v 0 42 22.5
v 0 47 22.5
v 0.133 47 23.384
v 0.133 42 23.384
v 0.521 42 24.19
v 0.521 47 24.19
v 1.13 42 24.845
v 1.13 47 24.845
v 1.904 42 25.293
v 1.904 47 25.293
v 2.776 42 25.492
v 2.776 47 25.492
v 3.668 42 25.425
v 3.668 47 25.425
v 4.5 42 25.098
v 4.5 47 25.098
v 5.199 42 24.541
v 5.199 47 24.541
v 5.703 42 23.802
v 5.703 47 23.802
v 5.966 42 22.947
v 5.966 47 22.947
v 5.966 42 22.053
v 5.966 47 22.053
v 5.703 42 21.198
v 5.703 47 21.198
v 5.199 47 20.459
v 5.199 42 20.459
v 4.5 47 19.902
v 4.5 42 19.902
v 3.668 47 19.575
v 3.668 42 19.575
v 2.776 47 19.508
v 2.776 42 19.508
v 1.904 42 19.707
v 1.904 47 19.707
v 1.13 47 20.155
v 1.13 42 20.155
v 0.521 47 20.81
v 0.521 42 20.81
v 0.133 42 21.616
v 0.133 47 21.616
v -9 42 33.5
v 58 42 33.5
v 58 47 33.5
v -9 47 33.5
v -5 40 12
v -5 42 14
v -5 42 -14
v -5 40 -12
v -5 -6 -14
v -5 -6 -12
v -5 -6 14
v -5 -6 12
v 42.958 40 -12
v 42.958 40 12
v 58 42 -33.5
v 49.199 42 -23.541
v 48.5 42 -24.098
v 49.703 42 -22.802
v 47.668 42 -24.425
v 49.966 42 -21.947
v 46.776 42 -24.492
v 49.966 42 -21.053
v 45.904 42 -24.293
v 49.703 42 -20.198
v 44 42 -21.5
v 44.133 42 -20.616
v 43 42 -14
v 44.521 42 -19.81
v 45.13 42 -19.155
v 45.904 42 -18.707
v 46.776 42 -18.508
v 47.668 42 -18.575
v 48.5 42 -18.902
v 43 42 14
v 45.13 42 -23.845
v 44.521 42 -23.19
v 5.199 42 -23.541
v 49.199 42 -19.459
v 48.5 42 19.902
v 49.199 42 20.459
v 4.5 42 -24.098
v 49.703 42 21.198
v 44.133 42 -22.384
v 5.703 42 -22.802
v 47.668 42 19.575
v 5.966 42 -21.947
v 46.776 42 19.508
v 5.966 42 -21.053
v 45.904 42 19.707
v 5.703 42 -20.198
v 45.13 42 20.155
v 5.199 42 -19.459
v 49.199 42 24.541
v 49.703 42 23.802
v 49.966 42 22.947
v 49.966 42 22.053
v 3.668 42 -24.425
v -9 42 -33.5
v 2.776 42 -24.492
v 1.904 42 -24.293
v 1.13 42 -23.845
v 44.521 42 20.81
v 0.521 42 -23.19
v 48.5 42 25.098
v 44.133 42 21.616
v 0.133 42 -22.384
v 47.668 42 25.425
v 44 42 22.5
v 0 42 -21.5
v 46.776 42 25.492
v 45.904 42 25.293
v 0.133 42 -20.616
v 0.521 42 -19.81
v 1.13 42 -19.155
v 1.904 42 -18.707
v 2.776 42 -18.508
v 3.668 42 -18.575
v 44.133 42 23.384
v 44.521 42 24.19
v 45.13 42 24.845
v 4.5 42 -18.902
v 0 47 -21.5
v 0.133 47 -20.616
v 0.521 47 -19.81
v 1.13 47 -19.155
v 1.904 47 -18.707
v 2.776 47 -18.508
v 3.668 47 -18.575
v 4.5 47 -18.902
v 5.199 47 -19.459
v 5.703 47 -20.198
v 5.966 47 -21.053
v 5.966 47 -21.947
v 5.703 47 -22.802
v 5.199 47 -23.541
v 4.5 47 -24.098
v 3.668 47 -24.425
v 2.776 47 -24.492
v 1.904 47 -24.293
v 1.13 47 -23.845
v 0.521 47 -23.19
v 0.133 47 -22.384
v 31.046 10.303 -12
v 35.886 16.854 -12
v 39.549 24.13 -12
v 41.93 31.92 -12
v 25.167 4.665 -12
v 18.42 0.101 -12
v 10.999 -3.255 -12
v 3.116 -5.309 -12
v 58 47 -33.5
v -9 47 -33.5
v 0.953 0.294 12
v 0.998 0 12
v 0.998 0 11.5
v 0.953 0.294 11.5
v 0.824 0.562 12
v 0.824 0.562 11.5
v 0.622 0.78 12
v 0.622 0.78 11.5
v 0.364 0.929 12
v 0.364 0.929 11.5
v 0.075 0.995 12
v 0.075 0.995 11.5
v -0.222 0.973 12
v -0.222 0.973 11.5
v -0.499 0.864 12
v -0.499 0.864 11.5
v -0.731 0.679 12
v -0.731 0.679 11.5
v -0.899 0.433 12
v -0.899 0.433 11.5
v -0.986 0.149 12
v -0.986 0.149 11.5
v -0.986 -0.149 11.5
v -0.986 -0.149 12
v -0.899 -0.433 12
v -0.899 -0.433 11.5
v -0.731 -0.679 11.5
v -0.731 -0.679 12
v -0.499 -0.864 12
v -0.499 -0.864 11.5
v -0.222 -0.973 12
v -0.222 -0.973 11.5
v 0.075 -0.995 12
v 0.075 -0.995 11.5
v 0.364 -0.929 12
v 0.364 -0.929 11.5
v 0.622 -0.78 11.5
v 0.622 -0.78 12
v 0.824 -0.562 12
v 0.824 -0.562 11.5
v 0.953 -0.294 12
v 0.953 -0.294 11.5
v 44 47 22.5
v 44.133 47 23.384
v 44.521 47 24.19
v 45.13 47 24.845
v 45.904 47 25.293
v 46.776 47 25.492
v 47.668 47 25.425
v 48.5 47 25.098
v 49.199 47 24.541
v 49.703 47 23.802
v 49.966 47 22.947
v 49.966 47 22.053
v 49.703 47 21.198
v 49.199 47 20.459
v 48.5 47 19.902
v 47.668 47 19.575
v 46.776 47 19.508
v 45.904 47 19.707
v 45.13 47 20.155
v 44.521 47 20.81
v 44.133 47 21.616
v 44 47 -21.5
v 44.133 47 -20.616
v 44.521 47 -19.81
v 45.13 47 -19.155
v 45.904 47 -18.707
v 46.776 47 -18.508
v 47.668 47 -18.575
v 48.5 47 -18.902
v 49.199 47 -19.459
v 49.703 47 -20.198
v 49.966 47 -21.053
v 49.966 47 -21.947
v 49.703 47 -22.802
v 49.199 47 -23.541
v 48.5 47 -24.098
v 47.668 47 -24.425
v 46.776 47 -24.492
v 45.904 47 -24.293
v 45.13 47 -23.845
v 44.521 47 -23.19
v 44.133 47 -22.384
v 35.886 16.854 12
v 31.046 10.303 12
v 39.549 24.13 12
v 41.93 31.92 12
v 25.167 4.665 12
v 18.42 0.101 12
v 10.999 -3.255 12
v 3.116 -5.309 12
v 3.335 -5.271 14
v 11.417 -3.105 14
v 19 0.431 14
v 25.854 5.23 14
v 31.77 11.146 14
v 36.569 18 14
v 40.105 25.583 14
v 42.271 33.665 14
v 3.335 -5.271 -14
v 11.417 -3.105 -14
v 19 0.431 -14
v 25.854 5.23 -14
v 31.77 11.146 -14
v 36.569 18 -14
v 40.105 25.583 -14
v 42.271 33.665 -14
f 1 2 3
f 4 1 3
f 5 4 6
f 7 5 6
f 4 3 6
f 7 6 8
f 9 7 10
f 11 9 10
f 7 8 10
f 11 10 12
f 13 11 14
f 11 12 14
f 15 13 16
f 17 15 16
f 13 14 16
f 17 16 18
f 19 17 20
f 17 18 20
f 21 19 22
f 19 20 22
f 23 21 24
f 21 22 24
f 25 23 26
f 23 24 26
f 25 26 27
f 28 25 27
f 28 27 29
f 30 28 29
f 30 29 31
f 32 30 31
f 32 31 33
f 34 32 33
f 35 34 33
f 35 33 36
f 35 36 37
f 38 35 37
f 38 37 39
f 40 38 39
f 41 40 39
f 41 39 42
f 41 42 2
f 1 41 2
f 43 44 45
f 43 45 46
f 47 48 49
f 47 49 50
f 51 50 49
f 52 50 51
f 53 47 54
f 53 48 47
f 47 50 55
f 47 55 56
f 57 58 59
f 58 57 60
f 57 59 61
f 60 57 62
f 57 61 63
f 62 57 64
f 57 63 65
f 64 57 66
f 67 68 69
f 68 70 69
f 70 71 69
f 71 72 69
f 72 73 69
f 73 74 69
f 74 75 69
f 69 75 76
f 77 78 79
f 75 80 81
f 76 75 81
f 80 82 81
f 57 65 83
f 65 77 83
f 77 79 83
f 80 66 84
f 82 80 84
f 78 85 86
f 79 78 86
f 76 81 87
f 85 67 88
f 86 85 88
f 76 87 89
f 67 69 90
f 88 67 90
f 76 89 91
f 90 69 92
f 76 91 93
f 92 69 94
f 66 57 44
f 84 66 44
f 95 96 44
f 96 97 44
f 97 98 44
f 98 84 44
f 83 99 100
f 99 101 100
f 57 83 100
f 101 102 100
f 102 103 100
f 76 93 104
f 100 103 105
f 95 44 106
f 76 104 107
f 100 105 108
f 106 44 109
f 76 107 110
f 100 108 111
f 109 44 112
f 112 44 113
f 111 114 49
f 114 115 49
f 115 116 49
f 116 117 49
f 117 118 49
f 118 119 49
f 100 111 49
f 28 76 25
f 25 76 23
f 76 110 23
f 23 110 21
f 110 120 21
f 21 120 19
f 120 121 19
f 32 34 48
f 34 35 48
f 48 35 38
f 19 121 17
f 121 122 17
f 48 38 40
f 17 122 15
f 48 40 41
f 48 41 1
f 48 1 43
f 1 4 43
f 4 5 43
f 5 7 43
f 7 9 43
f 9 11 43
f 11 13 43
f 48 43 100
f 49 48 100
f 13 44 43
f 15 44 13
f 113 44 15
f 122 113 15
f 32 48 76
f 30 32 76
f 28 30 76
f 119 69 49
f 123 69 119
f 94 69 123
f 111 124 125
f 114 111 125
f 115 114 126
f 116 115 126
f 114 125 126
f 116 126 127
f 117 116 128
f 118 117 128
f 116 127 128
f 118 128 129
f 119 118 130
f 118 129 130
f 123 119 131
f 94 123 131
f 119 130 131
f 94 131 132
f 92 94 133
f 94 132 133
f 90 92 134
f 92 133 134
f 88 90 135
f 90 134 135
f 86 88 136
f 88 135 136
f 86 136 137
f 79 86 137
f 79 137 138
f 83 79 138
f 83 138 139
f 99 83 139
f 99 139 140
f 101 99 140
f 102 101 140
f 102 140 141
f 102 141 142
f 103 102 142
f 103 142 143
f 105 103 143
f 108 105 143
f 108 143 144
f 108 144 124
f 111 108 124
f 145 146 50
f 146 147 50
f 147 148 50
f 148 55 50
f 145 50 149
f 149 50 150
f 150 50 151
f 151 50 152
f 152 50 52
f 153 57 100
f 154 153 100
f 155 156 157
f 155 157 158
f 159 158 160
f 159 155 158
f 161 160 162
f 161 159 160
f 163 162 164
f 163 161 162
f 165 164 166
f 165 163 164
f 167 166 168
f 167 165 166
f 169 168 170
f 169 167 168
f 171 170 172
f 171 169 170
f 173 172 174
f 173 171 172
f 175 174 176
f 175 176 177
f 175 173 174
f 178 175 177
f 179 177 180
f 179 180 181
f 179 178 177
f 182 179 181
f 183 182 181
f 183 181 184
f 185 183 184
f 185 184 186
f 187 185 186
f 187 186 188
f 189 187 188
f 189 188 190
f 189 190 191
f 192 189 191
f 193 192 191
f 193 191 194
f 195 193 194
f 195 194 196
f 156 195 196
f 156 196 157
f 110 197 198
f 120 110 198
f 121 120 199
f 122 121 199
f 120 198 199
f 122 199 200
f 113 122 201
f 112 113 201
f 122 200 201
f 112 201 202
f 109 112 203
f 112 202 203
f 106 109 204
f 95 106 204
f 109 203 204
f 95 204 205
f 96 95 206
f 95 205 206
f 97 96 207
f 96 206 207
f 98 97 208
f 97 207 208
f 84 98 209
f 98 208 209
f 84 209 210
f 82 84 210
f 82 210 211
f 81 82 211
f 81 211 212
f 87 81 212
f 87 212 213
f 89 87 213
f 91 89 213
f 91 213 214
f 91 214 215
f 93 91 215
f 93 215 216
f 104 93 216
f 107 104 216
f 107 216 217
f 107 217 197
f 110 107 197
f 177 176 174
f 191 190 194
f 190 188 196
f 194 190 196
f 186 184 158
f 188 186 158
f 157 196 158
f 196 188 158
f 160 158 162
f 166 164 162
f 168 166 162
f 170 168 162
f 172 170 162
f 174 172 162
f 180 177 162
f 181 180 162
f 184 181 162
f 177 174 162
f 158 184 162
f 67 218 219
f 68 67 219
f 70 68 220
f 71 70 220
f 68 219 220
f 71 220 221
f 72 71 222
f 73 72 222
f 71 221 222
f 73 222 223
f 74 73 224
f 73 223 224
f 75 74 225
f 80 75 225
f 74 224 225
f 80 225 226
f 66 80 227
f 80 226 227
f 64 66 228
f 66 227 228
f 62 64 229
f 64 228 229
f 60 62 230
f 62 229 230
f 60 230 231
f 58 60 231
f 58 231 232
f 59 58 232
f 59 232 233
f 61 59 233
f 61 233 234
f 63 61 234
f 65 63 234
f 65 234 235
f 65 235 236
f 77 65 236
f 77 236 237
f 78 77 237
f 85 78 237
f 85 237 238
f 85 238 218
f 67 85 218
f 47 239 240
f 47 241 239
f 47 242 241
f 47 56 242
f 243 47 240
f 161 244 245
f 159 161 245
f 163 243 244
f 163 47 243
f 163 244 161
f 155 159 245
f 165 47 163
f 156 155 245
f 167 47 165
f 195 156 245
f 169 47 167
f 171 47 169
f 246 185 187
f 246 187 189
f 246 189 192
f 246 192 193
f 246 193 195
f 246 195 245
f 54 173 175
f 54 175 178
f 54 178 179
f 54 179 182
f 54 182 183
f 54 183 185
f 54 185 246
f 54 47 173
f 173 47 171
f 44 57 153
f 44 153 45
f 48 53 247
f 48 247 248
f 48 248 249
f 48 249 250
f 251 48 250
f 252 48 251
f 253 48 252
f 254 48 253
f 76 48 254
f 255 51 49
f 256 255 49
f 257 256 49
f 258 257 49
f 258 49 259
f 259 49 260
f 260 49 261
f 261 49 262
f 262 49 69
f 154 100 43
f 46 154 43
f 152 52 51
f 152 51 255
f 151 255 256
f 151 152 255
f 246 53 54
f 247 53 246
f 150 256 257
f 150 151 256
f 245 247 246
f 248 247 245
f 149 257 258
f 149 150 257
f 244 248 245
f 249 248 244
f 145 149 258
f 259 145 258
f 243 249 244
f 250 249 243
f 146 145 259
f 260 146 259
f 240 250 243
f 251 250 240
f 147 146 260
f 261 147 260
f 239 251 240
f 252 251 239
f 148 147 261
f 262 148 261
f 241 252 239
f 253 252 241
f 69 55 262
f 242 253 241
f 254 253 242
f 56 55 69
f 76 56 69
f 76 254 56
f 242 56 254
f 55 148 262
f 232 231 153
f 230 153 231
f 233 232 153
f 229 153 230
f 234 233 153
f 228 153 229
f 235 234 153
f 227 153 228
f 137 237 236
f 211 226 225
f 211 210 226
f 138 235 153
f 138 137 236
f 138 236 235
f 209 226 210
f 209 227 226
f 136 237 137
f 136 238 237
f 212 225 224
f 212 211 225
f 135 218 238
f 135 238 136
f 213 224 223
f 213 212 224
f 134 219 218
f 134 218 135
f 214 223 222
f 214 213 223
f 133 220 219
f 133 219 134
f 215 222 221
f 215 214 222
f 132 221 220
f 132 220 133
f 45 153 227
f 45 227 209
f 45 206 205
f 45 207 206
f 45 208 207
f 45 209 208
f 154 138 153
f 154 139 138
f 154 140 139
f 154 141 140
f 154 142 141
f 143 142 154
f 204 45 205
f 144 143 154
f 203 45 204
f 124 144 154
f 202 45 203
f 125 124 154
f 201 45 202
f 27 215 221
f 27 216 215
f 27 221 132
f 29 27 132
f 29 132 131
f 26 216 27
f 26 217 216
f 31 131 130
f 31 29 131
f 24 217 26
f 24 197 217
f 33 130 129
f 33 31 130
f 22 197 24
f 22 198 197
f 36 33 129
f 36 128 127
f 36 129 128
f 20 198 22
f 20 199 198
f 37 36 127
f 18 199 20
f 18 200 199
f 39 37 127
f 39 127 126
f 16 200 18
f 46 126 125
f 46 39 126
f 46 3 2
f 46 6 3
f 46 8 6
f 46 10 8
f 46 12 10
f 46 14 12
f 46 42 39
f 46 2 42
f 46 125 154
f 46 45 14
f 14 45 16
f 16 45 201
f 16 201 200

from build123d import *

# Parameters (mm, degrees)
F1_DEPTH = 14
F2_W     = 46
F2_H     = 24
F3_DEPTH = 55
F4_R     = 0.997642
F5_DEPTH = 2.5
F6_W     = 67
F6_H     = 67
F7_DEPTH = 5
F8_R     = 3
F9_DEPTH = 25


with BuildPart() as f1:
    # F0 (on Top) → F1 (new body, symmetric)
    with BuildSketch(Plane.XY):
        with BuildLine():
            Line((43, 42), (-5, 42))
            Line((-5, 42), (-5, -6))
            ThreePointArc((-5, -6), (28.941125, 8.058875), (43, 42))
        make_face()
    extrude(amount=F1_DEPTH, both=True)

    # F2 (on face) → F3 (cut)
    with BuildSketch(Plane(origin=(-5, 0, 0), x_dir=(0, -1, 0), z_dir=(-1, 0, 0))):
        with Locations((-17, 0)):
            Rectangle(F2_W, F2_H)
    extrude(amount=-F3_DEPTH, mode=Mode.SUBTRACT)

    # F4 (on face) → F5 (join)
    with BuildSketch(Plane.XY.offset(14)):
        Circle(F4_R)
    extrude(amount=-F5_DEPTH)

    # F6 (on face) → F7 (join)
    with BuildSketch(Plane(origin=(0, 42, 0), x_dir=(-1, 0, 0), z_dir=(0, 1, 0))):
        with Locations((-24.5, 0)):
            Rectangle(F6_W, F6_H)
    extrude(amount=F7_DEPTH)

    # F8 (on face) → F9 (cut)
    with BuildSketch(Plane(origin=(0, 47, 0), x_dir=(-1, 0, 0), z_dir=(0, 1, 0))):
        with Locations((-47, 22.5)):
            Circle(F8_R)
        with Locations((-3, 22.5)):
            Circle(F8_R)
        with Locations((-47, -21.5)):
            Circle(F8_R)
        with Locations((-3, -21.5)):
            Circle(F8_R)
    extrude(amount=-F9_DEPTH, mode=Mode.SUBTRACT)


solid = f1.part
